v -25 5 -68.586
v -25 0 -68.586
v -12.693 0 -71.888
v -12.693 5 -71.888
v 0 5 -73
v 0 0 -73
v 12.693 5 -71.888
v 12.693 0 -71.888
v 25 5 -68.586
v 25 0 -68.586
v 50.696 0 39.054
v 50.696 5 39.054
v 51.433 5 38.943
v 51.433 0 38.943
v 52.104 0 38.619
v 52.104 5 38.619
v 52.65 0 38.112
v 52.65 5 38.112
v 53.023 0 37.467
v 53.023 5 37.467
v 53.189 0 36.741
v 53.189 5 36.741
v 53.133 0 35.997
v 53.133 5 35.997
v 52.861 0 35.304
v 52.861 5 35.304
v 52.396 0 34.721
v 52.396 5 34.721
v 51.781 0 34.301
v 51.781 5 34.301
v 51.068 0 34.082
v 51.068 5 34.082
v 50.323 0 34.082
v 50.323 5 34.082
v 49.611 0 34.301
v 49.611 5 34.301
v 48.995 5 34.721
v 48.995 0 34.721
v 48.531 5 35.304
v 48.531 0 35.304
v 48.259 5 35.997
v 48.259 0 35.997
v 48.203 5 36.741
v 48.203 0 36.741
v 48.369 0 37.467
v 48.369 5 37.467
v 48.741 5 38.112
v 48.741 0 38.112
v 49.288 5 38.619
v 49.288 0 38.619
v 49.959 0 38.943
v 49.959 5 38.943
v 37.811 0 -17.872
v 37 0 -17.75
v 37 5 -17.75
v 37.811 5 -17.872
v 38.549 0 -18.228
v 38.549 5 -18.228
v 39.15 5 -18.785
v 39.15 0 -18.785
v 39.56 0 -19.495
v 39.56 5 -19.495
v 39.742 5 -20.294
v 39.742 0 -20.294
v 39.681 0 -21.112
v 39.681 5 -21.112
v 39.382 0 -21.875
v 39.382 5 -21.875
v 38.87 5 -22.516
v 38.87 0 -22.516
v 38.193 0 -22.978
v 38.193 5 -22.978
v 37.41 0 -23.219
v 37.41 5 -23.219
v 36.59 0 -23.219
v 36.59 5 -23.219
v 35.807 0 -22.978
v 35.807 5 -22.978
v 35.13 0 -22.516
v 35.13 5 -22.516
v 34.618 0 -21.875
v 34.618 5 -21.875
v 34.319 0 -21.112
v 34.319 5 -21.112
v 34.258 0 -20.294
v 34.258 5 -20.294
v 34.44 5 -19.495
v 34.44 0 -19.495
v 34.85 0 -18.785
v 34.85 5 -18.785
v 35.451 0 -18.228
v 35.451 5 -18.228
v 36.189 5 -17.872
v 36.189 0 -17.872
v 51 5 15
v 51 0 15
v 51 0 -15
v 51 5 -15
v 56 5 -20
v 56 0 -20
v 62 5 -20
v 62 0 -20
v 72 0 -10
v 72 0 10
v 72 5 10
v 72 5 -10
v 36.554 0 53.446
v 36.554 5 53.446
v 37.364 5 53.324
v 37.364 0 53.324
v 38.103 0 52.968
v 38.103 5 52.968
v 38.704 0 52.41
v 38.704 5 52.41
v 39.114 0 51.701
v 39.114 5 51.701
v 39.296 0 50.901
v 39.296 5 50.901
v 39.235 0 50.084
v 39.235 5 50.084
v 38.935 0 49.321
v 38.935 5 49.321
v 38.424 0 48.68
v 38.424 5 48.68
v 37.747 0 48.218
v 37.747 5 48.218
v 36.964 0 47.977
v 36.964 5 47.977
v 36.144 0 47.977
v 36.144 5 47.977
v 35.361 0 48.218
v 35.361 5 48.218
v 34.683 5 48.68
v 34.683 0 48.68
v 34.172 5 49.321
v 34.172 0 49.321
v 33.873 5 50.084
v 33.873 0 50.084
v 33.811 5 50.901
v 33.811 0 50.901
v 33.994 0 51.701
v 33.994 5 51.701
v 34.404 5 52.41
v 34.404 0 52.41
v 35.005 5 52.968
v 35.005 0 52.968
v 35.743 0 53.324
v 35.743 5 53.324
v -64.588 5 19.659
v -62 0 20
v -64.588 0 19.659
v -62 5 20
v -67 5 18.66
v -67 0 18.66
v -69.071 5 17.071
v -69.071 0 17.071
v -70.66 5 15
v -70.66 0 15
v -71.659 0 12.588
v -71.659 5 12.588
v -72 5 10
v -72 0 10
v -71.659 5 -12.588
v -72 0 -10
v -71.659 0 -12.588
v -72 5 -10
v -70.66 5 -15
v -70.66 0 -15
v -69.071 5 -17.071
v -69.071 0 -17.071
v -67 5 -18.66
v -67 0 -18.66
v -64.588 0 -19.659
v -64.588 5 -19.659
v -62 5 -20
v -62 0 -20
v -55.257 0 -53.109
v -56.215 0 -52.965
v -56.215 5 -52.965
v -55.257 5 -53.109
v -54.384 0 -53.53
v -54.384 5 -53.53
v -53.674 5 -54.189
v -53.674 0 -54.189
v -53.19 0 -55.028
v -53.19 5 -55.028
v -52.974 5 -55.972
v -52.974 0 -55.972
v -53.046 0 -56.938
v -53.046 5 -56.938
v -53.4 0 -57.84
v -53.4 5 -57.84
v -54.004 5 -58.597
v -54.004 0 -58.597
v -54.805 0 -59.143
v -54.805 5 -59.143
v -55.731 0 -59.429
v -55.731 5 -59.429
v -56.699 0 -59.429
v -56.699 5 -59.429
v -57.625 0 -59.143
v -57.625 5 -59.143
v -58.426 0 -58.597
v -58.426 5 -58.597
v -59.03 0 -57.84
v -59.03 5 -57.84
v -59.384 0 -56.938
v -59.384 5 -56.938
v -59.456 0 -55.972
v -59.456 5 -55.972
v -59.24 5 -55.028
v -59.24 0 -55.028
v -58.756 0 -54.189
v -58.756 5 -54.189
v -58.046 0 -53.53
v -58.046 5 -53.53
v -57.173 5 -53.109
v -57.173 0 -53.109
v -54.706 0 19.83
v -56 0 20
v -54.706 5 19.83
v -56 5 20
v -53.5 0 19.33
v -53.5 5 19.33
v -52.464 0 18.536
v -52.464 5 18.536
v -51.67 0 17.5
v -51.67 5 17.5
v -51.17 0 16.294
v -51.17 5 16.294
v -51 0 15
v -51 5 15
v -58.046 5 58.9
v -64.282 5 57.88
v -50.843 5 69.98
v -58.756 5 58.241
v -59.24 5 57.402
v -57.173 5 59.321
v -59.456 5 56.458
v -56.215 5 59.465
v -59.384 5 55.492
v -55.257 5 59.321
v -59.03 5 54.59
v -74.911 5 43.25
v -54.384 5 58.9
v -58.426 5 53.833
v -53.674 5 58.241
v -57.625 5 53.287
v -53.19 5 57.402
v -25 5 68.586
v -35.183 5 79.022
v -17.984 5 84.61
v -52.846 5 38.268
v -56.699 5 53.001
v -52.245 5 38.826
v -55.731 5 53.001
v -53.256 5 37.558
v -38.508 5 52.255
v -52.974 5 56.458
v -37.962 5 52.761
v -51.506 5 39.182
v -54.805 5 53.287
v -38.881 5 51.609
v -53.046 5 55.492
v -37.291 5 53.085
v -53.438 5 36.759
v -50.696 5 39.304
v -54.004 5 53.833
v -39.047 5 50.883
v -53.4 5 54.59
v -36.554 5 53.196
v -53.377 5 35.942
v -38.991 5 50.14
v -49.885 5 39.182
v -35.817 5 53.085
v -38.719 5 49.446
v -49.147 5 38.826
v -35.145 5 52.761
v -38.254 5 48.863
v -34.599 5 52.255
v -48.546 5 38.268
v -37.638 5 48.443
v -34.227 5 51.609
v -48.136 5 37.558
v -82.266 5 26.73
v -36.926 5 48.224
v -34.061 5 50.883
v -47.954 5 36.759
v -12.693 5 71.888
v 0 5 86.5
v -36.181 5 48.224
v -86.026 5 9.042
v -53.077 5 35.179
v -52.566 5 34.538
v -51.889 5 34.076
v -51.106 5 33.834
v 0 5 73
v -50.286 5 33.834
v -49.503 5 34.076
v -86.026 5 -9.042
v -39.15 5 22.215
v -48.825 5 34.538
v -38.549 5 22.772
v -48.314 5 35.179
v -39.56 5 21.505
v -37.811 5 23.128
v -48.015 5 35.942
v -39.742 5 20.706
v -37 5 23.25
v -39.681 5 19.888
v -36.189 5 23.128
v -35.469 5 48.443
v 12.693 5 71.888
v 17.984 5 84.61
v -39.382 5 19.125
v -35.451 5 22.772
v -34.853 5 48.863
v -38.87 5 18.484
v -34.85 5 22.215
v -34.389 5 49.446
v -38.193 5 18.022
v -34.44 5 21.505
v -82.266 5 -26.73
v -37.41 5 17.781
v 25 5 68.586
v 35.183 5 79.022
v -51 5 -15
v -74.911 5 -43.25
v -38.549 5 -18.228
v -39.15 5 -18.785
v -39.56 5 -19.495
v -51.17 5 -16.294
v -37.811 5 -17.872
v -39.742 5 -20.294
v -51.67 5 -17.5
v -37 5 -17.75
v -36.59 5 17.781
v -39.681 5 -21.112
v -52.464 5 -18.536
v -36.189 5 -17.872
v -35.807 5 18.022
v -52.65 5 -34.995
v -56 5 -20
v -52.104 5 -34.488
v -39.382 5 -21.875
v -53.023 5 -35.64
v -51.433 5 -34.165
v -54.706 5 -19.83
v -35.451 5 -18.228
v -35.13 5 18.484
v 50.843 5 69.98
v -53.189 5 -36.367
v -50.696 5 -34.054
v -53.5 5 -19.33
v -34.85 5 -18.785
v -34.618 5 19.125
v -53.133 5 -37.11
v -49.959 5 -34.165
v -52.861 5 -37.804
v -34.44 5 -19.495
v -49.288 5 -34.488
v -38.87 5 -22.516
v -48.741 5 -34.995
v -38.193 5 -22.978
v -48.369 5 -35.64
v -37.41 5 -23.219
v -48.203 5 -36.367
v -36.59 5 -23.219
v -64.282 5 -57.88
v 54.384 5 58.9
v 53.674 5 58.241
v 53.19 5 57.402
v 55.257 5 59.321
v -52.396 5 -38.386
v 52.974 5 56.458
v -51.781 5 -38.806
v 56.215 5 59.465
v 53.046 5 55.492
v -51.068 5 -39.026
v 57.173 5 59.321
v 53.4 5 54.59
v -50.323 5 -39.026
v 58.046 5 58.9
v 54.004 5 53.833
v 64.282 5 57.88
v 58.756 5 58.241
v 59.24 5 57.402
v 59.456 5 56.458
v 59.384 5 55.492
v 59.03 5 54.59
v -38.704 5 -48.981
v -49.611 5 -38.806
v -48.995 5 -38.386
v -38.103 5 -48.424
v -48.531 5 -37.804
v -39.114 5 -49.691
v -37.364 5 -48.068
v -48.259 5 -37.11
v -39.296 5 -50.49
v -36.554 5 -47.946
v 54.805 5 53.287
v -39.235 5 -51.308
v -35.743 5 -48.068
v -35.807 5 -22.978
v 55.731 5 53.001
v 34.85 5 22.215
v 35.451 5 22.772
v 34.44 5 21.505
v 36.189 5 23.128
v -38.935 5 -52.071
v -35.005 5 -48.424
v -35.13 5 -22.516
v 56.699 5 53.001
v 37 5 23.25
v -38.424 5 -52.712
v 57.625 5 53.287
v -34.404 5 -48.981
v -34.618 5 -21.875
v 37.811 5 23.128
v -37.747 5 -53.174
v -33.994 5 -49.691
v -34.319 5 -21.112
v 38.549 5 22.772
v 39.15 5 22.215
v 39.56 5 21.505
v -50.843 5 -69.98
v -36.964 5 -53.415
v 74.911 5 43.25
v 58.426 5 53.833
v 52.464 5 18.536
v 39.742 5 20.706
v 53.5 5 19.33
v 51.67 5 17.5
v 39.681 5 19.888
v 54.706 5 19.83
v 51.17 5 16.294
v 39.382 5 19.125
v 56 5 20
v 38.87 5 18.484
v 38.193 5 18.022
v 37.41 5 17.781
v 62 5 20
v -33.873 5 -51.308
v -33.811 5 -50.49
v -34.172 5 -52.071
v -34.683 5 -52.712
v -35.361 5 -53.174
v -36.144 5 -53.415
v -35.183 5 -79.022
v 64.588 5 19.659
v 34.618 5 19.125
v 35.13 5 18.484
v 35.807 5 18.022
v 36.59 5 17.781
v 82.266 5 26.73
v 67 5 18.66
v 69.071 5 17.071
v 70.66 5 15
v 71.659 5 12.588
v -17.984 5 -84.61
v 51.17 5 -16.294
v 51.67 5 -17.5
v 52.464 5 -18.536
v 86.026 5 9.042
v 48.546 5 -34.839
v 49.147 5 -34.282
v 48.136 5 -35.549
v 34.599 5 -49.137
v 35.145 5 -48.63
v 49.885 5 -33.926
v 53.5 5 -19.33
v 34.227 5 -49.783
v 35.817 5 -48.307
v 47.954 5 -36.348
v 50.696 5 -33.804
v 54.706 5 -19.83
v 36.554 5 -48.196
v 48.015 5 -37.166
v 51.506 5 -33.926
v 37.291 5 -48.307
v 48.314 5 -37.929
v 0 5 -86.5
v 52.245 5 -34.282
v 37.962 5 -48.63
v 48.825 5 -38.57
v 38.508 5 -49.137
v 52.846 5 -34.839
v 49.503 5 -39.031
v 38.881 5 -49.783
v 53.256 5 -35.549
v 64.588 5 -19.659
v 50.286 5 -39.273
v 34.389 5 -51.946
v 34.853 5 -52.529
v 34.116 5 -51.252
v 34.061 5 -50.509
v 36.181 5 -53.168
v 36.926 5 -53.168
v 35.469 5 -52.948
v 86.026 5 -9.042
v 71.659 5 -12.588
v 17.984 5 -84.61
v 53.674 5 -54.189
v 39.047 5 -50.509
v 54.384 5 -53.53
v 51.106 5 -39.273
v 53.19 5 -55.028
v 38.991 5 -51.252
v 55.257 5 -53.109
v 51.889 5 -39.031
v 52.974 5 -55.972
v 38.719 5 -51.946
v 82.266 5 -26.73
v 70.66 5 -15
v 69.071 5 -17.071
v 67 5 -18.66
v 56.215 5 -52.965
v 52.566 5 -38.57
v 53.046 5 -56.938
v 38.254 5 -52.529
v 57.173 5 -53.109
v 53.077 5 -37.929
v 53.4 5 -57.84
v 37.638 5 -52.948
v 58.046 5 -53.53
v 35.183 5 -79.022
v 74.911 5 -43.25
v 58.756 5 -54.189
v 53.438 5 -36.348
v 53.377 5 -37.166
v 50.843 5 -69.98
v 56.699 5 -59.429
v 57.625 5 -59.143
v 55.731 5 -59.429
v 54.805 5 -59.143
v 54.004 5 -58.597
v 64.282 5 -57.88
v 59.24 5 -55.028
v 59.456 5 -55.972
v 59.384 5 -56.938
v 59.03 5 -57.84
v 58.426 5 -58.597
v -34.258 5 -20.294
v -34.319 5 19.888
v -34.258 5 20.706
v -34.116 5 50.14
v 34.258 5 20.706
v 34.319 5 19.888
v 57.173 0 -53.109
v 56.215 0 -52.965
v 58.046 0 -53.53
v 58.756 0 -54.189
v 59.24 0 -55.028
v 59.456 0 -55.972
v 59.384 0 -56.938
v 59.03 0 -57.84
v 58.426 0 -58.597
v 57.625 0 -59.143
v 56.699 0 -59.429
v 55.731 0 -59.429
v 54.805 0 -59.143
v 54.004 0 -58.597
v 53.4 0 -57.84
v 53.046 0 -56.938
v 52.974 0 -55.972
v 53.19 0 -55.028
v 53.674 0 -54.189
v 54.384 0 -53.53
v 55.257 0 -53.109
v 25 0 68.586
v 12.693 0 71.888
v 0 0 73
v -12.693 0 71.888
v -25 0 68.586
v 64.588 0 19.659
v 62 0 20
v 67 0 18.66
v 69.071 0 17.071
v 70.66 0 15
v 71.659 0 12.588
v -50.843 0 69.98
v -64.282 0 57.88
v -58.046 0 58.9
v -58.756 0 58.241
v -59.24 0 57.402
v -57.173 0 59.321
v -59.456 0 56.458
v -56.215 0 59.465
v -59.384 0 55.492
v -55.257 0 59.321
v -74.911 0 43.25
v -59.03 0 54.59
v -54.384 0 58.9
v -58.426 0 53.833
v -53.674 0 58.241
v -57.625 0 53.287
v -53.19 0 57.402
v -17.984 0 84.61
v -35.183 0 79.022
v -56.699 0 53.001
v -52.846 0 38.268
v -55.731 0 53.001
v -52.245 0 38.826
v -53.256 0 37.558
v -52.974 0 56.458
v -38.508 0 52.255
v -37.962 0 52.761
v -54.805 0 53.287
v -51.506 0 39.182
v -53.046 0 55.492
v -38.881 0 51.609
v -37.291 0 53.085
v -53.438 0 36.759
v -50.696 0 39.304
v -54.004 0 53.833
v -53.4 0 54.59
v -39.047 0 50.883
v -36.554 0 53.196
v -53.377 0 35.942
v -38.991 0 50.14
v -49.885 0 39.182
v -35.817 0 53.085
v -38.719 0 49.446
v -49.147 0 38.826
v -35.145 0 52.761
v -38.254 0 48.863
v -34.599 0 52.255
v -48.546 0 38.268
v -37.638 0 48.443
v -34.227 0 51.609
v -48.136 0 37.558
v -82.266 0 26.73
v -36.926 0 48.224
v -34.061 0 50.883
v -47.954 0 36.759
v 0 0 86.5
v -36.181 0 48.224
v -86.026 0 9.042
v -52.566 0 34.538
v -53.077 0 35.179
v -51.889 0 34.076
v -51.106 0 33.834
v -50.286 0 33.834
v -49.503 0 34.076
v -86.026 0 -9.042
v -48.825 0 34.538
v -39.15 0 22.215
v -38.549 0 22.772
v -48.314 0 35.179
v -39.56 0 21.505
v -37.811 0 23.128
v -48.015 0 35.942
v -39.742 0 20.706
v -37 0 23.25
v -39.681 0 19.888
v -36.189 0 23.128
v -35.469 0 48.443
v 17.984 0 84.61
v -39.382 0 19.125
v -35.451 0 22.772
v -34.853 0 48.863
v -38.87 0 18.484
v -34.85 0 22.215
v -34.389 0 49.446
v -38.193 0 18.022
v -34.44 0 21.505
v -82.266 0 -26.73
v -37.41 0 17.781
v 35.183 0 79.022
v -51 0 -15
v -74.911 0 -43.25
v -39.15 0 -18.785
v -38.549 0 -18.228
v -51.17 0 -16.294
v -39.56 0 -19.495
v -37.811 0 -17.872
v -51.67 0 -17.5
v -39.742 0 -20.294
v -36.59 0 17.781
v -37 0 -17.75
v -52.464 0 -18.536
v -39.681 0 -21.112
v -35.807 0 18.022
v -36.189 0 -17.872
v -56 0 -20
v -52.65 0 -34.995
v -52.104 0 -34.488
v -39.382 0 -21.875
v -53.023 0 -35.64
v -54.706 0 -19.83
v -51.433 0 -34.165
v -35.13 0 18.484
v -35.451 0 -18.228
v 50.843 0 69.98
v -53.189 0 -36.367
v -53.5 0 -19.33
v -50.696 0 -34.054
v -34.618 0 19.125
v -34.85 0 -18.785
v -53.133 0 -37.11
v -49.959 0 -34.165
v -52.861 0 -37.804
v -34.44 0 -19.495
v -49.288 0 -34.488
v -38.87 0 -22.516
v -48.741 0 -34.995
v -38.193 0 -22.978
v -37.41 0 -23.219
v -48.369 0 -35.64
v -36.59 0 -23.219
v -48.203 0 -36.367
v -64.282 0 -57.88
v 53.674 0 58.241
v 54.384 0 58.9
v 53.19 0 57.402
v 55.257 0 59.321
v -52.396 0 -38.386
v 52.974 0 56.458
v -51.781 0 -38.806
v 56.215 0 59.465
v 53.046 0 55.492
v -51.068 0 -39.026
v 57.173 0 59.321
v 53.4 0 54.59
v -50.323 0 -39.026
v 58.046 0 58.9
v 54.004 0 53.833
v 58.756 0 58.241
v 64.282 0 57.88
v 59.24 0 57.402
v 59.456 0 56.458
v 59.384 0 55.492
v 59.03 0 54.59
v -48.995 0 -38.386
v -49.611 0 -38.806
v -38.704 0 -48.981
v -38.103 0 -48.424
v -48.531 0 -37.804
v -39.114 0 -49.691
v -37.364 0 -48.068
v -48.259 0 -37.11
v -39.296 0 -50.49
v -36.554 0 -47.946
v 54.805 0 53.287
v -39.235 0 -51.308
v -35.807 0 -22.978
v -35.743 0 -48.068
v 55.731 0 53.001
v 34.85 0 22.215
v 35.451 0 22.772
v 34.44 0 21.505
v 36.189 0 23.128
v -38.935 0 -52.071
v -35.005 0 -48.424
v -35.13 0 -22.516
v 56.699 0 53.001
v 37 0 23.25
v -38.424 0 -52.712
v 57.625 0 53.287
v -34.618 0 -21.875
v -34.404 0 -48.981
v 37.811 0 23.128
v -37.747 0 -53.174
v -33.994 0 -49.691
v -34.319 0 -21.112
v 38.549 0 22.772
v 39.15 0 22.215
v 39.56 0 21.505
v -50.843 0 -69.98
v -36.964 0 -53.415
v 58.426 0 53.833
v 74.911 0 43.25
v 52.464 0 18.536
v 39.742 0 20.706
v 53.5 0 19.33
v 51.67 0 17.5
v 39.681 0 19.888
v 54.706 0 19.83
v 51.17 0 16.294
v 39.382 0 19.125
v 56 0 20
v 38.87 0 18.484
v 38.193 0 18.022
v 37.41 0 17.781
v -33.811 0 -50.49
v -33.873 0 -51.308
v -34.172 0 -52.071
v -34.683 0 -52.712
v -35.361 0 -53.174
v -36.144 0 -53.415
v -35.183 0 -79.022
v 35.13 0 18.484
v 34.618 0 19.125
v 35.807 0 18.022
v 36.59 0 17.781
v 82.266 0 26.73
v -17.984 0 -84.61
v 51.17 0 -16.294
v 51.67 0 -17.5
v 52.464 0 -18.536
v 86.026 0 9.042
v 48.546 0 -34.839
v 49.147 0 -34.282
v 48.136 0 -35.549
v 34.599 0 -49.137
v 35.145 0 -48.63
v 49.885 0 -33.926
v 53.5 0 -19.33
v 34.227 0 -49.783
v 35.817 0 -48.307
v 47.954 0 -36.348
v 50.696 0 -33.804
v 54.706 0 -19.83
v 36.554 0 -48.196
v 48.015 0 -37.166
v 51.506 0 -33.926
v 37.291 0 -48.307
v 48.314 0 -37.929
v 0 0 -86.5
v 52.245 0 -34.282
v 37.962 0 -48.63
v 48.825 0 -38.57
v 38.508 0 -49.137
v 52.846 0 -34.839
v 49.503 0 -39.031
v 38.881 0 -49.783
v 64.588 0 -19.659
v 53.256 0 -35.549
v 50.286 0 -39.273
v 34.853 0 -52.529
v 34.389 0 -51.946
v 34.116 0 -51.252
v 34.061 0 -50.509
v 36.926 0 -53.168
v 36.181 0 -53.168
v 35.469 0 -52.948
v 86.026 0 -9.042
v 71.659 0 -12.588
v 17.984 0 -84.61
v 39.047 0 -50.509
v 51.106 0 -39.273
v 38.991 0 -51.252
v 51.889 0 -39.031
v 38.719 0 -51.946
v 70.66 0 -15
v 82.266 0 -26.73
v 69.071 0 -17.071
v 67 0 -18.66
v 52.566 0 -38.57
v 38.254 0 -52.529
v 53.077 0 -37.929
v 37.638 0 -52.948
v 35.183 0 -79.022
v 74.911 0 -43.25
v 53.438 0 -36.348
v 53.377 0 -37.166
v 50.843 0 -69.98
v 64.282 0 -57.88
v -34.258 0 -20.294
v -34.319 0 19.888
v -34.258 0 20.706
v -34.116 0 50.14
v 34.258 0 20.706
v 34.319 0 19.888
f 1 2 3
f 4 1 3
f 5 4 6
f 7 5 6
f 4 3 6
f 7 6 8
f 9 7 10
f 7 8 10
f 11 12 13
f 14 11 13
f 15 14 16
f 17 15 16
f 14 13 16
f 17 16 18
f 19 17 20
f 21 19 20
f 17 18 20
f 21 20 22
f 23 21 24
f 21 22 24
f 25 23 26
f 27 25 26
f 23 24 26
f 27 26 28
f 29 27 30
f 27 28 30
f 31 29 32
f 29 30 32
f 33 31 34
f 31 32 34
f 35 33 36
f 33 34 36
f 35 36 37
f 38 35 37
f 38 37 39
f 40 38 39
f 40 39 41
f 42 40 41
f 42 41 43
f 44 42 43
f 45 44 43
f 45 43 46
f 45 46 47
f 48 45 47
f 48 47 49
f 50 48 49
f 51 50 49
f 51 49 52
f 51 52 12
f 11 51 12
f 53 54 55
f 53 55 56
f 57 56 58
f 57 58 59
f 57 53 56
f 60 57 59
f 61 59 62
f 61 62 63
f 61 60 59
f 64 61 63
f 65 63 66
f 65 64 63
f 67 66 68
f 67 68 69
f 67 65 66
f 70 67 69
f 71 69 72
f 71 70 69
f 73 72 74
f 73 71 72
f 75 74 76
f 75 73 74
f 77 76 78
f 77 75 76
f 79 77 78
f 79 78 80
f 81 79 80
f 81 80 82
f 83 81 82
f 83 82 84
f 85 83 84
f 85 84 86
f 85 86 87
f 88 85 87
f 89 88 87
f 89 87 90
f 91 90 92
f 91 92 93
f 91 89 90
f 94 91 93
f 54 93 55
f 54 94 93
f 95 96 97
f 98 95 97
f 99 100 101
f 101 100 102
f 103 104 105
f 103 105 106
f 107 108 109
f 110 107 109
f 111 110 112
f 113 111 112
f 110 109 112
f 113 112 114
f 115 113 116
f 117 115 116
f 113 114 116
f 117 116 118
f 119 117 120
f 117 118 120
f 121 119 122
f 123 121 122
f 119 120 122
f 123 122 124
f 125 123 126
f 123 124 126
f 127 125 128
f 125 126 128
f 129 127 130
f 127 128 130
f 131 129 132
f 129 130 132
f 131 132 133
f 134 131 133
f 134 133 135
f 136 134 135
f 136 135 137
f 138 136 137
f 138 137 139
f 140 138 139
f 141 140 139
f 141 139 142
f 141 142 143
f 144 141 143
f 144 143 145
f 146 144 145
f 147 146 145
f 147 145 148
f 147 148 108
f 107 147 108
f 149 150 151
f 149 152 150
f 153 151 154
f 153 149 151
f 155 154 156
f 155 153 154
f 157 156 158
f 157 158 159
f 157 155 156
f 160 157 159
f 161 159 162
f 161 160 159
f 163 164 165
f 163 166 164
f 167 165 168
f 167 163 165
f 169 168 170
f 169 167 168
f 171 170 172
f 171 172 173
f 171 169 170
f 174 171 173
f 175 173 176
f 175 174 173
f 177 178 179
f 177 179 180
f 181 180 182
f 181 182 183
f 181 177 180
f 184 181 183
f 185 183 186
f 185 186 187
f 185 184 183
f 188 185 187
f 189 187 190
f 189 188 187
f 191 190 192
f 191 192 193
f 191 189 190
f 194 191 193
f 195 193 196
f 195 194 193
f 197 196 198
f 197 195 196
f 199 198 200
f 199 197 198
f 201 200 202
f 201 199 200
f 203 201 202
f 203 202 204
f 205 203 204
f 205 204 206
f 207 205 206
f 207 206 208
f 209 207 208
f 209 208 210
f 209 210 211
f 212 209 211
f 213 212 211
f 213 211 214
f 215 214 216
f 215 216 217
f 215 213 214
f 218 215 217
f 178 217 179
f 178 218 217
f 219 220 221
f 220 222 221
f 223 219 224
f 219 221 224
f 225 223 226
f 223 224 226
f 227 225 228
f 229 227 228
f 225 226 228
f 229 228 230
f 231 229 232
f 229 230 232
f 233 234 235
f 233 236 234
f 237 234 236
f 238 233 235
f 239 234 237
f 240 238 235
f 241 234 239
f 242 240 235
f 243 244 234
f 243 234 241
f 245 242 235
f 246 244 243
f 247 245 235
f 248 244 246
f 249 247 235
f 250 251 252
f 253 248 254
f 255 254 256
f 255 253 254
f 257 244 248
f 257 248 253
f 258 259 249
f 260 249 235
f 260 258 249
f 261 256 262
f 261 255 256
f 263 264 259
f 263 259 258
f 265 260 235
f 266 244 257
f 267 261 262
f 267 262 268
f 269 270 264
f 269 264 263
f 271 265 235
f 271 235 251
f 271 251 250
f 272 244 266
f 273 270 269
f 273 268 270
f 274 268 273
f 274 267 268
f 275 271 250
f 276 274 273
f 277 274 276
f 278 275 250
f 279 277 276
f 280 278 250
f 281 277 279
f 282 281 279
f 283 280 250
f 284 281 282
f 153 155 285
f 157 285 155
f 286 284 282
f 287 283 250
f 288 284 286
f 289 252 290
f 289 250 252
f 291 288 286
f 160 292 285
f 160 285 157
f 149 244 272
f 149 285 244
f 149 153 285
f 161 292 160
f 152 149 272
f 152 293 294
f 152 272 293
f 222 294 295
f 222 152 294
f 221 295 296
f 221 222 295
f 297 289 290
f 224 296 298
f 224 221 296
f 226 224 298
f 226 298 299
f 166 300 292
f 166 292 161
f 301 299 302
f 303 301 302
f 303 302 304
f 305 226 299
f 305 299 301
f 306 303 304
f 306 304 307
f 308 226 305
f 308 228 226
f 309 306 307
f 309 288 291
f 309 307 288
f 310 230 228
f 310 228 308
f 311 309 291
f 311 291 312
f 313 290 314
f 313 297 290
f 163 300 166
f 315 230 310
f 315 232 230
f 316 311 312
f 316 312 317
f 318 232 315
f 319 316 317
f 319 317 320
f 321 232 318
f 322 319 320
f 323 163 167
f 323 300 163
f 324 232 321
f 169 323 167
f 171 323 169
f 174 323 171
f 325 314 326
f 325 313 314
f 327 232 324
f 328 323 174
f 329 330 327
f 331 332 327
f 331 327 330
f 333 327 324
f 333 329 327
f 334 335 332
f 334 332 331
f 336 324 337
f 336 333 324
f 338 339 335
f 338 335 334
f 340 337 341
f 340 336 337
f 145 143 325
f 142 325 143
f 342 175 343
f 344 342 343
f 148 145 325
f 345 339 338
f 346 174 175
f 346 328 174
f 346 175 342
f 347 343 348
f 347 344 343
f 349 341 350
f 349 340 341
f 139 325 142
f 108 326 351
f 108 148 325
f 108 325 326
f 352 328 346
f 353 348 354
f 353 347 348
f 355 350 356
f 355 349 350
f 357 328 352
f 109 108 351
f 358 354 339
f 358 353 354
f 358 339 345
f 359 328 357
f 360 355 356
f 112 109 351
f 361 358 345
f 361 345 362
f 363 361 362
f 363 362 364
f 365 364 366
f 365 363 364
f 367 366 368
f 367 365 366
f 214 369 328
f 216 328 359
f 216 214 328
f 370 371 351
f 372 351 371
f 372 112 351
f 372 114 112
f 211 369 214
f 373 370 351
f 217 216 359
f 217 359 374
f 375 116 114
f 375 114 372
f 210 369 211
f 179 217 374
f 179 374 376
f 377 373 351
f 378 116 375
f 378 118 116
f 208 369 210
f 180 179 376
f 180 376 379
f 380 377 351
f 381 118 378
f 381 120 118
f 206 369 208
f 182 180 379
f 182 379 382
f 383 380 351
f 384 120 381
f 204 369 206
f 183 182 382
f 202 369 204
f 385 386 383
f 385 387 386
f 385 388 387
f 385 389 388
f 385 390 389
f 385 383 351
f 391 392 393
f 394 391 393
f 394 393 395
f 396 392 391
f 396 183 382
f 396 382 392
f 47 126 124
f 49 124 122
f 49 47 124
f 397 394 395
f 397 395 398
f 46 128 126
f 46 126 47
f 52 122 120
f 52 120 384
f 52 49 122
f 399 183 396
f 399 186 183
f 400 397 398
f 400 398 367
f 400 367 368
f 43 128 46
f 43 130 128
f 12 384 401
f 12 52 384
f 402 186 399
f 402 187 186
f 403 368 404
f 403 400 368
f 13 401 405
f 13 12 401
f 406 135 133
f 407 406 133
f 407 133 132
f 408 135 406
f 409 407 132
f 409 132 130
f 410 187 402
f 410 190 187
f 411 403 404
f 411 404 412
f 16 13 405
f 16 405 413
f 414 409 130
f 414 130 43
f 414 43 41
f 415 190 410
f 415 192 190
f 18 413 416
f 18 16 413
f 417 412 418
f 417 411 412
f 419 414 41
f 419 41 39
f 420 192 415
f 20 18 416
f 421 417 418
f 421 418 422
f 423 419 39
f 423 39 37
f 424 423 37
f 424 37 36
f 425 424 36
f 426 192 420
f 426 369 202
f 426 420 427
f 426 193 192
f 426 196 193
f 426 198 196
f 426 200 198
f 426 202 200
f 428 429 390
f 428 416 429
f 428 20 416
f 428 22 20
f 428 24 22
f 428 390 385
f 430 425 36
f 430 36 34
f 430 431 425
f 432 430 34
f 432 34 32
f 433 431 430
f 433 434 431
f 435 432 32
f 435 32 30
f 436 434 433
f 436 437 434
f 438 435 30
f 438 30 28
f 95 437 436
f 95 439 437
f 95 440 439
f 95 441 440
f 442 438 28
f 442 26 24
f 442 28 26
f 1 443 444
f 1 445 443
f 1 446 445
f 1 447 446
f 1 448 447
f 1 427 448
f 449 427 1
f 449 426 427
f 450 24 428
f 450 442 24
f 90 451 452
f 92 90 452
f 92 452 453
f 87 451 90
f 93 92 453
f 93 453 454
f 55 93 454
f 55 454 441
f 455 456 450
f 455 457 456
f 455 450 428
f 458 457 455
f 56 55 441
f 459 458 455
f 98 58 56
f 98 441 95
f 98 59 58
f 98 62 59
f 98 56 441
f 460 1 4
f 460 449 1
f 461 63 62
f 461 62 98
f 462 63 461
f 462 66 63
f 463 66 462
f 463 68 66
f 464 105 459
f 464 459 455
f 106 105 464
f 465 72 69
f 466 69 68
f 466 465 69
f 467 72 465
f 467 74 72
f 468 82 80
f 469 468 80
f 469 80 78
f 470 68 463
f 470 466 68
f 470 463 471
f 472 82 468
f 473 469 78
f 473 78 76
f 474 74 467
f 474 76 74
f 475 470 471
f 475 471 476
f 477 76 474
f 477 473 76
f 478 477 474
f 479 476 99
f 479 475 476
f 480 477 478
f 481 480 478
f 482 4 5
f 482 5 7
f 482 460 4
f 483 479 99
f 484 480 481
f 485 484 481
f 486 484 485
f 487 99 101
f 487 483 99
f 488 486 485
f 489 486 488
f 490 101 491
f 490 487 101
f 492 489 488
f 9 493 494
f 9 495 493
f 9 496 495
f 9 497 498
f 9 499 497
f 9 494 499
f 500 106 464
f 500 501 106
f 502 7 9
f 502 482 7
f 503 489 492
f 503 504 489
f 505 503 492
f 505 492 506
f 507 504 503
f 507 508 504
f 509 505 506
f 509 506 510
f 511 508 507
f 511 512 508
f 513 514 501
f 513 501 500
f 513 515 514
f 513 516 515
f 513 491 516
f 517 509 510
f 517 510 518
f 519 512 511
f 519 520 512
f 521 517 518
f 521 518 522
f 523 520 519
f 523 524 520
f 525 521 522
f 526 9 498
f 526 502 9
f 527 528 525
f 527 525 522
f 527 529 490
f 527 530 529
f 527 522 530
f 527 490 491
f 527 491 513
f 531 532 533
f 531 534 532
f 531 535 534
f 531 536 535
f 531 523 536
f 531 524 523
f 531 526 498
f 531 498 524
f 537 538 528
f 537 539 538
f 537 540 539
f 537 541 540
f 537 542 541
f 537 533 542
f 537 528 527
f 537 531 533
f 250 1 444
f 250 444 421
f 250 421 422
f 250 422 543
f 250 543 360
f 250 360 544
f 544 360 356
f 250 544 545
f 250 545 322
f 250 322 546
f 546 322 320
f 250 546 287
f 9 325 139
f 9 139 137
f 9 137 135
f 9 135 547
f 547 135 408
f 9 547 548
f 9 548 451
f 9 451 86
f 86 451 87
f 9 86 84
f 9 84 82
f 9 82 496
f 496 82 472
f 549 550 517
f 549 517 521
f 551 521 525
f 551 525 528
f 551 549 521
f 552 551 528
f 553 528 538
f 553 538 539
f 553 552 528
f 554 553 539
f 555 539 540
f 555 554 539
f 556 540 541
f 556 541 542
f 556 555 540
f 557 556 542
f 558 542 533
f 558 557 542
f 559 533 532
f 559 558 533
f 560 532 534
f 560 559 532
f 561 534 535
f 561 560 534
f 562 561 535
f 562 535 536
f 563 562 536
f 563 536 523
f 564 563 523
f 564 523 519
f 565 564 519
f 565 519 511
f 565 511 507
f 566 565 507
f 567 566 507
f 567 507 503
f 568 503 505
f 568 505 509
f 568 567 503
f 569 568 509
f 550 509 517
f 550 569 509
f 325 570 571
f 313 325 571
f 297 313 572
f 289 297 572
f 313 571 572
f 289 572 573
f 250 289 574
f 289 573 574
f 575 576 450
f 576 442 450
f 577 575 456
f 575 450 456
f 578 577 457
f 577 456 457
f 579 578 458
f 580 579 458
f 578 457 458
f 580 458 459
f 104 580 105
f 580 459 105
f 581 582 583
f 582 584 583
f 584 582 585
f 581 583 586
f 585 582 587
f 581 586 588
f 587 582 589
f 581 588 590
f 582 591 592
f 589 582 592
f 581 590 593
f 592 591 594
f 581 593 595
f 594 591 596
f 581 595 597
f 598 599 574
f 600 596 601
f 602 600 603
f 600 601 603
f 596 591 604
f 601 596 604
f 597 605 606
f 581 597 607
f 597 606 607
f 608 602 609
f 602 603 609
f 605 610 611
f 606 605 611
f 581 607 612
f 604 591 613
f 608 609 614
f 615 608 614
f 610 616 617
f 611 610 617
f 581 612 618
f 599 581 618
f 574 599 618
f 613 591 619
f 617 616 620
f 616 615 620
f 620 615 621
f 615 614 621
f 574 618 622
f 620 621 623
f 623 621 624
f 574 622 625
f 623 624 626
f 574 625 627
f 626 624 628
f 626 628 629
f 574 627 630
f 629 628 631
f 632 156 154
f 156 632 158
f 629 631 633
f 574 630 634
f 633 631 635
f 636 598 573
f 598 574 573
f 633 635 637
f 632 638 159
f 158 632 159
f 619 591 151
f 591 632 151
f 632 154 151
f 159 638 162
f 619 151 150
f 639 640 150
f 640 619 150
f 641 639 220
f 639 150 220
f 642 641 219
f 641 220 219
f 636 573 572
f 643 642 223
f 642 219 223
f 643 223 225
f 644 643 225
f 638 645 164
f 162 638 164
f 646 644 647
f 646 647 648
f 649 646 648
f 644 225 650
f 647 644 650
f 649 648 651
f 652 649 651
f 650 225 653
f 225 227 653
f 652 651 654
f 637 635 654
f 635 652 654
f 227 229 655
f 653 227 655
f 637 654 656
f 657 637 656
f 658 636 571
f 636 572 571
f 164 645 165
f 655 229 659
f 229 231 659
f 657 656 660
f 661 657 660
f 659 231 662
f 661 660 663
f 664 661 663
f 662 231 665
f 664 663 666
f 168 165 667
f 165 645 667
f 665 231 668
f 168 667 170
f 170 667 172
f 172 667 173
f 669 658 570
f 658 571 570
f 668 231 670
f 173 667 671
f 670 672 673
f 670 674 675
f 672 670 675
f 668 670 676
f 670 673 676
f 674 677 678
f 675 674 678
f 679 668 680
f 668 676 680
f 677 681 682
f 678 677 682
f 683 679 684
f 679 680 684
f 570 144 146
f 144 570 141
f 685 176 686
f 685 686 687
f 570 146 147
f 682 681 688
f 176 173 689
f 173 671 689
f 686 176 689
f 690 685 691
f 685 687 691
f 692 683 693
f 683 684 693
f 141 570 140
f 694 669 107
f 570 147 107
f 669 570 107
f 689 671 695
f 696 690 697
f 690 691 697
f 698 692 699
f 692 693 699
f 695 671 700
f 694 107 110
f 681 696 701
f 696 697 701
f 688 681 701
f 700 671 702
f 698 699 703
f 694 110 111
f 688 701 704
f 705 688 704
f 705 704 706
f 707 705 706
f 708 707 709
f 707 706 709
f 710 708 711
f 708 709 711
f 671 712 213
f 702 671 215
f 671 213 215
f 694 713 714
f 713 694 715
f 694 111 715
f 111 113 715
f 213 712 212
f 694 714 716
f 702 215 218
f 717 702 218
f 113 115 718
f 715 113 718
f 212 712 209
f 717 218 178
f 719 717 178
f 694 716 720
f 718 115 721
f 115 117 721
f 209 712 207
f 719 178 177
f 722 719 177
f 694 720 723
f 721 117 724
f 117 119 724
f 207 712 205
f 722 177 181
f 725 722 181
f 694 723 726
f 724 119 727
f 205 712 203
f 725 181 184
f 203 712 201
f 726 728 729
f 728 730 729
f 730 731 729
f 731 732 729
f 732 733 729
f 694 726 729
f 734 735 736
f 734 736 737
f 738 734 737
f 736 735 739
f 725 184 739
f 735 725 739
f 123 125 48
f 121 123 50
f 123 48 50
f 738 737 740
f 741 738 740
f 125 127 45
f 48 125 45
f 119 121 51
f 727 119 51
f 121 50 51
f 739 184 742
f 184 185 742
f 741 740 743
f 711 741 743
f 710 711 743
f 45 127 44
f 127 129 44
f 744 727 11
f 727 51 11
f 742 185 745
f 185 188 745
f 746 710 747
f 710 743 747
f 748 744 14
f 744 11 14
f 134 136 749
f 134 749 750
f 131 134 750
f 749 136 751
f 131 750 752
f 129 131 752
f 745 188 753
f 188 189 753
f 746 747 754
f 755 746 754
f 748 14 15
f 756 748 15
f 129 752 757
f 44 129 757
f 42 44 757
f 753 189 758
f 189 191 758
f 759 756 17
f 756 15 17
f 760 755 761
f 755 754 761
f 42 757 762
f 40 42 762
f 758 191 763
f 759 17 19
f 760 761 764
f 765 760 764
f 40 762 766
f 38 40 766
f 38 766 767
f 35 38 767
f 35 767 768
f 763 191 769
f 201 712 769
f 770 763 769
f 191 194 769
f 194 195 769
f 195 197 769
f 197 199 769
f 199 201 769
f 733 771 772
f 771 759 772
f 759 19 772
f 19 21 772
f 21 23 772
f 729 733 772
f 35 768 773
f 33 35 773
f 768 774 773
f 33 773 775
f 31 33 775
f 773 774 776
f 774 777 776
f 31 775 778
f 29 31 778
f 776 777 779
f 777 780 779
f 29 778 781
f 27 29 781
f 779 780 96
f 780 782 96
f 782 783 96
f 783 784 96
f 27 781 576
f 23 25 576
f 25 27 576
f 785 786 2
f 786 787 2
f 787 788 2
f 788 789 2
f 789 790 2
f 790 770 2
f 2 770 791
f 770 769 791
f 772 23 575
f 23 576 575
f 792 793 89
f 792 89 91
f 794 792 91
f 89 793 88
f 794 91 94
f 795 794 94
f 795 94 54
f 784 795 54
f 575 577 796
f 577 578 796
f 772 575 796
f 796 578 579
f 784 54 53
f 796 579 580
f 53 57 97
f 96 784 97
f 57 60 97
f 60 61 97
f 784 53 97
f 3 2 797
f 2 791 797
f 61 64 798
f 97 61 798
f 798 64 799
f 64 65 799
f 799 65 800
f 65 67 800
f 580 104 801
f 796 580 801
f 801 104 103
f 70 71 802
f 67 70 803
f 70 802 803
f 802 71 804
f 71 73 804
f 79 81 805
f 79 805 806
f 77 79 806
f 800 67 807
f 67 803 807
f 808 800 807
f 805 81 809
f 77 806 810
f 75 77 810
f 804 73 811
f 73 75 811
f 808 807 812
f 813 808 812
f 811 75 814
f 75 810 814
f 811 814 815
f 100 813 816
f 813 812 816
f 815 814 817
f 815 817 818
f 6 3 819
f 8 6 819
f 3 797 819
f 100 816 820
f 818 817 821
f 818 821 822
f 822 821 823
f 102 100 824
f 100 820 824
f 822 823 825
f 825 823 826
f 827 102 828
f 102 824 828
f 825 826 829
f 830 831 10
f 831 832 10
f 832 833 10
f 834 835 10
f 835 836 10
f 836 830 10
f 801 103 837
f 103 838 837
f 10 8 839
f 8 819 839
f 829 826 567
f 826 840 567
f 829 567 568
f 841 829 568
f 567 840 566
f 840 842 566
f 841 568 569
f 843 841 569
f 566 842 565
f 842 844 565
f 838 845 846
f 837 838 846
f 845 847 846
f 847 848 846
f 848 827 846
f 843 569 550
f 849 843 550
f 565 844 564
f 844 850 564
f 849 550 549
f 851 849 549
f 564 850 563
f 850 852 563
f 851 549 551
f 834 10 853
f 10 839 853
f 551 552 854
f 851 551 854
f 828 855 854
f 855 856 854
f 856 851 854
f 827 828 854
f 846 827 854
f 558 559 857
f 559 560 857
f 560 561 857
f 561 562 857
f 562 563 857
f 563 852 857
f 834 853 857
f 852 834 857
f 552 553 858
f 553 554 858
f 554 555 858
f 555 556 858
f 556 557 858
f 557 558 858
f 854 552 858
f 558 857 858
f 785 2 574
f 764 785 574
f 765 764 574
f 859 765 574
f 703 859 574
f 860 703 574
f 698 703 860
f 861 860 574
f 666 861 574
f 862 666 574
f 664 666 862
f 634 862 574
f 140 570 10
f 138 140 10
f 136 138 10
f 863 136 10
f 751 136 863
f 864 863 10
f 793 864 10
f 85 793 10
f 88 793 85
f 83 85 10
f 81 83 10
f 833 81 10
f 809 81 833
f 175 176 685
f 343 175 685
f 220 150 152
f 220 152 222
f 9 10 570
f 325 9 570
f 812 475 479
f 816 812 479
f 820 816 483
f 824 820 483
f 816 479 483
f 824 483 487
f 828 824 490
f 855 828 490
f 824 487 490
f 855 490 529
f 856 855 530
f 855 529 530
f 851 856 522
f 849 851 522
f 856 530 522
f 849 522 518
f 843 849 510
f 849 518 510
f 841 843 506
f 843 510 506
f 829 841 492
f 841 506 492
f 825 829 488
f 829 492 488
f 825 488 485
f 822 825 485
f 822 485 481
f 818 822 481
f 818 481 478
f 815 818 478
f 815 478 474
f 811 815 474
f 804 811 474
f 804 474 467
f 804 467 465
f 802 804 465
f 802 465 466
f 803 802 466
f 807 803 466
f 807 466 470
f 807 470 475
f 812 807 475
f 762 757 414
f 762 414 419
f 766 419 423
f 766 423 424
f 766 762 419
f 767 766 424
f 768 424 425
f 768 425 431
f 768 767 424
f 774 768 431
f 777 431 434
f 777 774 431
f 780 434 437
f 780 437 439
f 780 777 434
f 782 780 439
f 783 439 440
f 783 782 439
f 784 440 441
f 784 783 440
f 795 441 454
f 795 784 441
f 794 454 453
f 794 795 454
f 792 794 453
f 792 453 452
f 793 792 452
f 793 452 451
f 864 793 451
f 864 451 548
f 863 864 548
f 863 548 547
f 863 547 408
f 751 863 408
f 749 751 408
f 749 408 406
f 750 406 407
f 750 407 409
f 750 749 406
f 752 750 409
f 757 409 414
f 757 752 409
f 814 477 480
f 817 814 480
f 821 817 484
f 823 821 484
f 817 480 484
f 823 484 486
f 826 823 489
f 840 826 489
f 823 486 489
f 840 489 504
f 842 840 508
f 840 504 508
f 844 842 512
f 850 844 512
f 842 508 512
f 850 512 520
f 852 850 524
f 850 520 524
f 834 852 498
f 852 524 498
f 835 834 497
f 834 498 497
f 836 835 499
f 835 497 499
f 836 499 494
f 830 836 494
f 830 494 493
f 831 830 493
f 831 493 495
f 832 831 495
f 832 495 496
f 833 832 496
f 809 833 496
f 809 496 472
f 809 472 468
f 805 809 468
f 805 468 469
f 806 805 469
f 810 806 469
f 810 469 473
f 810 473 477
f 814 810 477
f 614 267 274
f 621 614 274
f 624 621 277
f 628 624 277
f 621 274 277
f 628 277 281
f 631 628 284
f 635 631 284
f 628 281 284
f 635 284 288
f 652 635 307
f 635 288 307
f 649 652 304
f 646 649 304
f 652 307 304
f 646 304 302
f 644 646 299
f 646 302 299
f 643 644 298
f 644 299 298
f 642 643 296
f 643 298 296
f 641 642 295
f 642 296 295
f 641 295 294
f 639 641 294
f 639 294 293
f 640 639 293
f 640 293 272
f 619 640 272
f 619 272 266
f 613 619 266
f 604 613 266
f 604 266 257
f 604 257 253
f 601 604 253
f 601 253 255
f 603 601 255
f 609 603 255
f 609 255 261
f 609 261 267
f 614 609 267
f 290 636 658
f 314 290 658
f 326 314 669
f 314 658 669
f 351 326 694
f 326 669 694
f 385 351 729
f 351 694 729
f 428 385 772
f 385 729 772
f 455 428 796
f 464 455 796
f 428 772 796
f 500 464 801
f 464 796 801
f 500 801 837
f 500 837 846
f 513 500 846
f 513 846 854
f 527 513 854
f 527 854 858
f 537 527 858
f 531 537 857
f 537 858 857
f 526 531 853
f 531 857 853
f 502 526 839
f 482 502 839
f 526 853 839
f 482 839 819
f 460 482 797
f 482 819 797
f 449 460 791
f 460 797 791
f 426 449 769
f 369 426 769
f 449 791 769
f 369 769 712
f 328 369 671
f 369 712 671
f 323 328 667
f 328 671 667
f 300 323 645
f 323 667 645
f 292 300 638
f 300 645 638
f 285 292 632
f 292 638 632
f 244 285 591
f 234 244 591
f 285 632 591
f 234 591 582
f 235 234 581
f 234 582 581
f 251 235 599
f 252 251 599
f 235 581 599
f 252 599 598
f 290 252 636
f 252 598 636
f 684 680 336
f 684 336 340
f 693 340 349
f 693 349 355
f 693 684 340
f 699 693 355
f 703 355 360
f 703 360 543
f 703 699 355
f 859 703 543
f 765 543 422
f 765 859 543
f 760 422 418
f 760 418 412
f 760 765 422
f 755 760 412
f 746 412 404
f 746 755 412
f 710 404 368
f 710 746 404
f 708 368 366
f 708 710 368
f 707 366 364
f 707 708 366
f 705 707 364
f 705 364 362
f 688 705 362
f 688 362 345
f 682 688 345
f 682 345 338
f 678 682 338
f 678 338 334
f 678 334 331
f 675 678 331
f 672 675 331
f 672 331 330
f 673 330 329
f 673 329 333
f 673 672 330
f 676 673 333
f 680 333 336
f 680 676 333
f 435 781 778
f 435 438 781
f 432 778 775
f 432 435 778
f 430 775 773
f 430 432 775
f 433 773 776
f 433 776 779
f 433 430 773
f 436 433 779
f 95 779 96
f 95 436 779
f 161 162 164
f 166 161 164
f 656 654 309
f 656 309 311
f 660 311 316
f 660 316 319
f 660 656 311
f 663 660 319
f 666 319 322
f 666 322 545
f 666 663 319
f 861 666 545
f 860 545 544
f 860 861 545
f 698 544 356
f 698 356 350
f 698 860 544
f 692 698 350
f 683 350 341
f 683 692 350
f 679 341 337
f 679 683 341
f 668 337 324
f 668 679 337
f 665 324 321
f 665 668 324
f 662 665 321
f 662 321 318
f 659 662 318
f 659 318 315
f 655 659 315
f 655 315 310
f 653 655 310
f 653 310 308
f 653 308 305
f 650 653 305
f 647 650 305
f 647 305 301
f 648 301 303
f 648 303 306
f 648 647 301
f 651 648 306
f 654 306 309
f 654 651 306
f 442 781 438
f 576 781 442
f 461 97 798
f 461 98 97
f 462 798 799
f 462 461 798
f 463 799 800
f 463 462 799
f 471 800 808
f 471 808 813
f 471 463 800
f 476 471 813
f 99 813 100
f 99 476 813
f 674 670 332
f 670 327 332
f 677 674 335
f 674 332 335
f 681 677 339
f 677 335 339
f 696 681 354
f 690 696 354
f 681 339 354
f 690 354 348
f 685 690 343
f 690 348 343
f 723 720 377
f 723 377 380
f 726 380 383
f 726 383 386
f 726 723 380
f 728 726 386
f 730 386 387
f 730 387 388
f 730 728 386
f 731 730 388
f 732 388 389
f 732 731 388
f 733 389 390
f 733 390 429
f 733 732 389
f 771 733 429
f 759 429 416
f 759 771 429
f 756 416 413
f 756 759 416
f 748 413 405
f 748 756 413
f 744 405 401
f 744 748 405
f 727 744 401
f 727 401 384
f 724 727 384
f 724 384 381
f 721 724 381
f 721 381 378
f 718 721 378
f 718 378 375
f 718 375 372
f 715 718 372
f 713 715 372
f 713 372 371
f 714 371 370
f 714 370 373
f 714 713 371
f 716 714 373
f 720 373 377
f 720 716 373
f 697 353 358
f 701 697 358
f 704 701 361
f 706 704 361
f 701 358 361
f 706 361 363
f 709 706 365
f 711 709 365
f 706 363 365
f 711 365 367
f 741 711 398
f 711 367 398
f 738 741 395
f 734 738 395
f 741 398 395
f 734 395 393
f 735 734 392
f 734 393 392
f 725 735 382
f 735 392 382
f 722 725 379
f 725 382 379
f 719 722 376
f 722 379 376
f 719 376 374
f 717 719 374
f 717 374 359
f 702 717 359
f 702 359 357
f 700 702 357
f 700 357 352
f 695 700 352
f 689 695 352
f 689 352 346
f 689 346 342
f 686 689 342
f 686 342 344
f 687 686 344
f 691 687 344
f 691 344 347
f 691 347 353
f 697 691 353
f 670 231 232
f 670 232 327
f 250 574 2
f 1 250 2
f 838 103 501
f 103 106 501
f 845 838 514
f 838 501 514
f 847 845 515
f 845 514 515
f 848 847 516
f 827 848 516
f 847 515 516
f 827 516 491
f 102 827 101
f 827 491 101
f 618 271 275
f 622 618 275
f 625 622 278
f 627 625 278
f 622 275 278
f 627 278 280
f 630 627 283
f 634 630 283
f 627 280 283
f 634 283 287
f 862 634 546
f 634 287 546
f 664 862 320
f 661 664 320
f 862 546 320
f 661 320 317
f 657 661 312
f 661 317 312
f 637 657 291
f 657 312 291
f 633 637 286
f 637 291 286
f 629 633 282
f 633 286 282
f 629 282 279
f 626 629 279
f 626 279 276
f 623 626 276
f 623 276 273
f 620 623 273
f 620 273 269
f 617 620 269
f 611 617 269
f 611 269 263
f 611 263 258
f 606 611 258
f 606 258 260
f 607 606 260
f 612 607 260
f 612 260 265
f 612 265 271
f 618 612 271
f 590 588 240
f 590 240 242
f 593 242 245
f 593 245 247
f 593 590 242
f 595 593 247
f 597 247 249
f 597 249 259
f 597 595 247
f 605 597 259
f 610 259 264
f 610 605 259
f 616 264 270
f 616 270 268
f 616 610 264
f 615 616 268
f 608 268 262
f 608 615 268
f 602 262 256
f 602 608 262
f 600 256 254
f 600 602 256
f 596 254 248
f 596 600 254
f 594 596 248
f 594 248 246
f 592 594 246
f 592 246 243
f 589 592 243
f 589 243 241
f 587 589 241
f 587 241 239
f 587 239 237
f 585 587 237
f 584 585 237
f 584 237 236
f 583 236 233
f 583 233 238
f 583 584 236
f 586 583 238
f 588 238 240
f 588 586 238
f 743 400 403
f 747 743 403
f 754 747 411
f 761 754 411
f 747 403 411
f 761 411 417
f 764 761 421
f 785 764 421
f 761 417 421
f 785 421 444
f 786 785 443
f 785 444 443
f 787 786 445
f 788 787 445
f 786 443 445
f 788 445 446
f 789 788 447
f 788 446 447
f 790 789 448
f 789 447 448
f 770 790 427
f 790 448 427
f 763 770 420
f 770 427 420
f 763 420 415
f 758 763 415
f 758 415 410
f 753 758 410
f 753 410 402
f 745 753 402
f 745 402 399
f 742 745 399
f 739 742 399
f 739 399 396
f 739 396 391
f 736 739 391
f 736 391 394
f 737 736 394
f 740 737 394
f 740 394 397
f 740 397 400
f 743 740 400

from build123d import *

# Parameters (mm, degrees)
SKETCH1_R           = 3.25
SKETCH1_R_2         = 2.75
SKETCH1_W           = 21
SKETCH1_H           = 40
BOSS_EXTRUDE1_DEPTH = 5
FILLET1_R           = 10
FILLET3_R           = 5
SKETCH3_R           = 2.75
SKETCH3_R_2         = 2.5
CUT_EXTRUDE1_DEPTH  = 10


with BuildPart() as part:
    # Sketch1 → Boss-Extrude1 (new body)
    with BuildSketch(Plane(origin=(0, 0, 0), x_dir=(1, 0, 0), z_dir=(0, 1, 0))):
        with BuildLine():
            ThreePointArc((0, 86.5), (-86.5, 0), (0, -86.5))
            ThreePointArc((0, -86.5), (86.5, 0), (0, 86.5))
        make_face()
        with Locations(Location((-56.214989104, -56.214989104, 0), (0, 0, 270))):
            Circle(SKETCH1_R, mode=Mode.SUBTRACT)
        with Locations(Location((-37, -20.5, 0), (0, 0, 270))):
            Circle(SKETCH1_R_2, mode=Mode.SUBTRACT)
        with Locations(Location((56.214989104, -56.214989104, 0), (0, 0, 270))):
            Circle(SKETCH1_R, mode=Mode.SUBTRACT)
        with Locations(Location((37, -20.5, 0), (0, 0, 270))):
            Circle(SKETCH1_R_2, mode=Mode.SUBTRACT)
        with Locations((-61.5, 0)):
            Rectangle(SKETCH1_W, SKETCH1_H, mode=Mode.SUBTRACT)
        with Locations(Location((-37, 20.5, 0), (0, 0, 270))):
            Circle(SKETCH1_R_2, mode=Mode.SUBTRACT)
        with Locations(Location((-56.214989104, 56.214989104, 0), (0, 0, 270))):
            Circle(SKETCH1_R, mode=Mode.SUBTRACT)
        with BuildLine():
            ThreePointArc((-25, 68.585712798), (0, 73), (25, 68.585712798))
            Line((25, 68.585712798), (25, 20))
            Line((25, 20), (25, -20))
            Line((25, -20), (25, -68.585712798))
            ThreePointArc((25, -68.585712798), (0, -73), (-25, -68.585712798))
            Line((-25, -68.585712798), (-25, -20))
            Line((-25, -20), (-25, 20))
            Line((-25, 20), (-25, 68.585712798))
        make_face(mode=Mode.SUBTRACT)
        with Locations(Location((37, 20.5, 0), (0, 0, 270))):
            Circle(SKETCH1_R_2, mode=Mode.SUBTRACT)
        with Locations((61.5, 0)):
            Rectangle(SKETCH1_W, SKETCH1_H, mode=Mode.SUBTRACT)
        with Locations(Location((56.214989104, 56.214989104, 0), (0, 0, 270))):
            Circle(SKETCH1_R, mode=Mode.SUBTRACT)
    extrude(amount=BOSS_EXTRUDE1_DEPTH)

    # Fillet1
    fillet1_edges = [part.edges().sort_by_distance(p)[0] for p in [
        (72, 2.5, 20),
        (72, 2.5, -20),
        (-72, 2.5, -20),
        (-72, 2.5, 20),
    ]]
    fillet(fillet1_edges, radius=FILLET1_R)

    # Fillet3
    fillet3_edges = [part.edges().sort_by_distance(p)[0] for p in [
        (51, 2.5, -20),
        (51, 2.5, 20),
        (-51, 2.5, -20),
        (-51, 2.5, 20),
    ]]
    fillet(fillet3_edges, radius=FILLET3_R)

    # Sketch3 → Cut-Extrude1 (cut)
    with BuildSketch(Plane(origin=(0, 5, 0), x_dir=(1, 0, 0), z_dir=(0, 1, 0))):
        with Locations(Location((-50.695888728, -36.553753105, 0), (0, 0, 270))):
            Circle(SKETCH3_R)
        with Locations(Location((-36.553753105, -50.695888728, 0), (0, 0, 270))):
            Circle(SKETCH3_R_2)
        with Locations(Location((-36.553753105, 50.695888728, 0), (0, 0, 270))):
            Circle(SKETCH3_R)
        with Locations(Location((-50.695888728, 36.553753105, 0), (0, 0, 270))):
            Circle(SKETCH3_R_2)
        with Locations(Location((50.695888728, 36.553753105, 0), (0, 0, 270))):
            Circle(SKETCH3_R)
        with Locations(Location((36.553753105, 50.695888728, 0), (0, 0, 270))):
            Circle(SKETCH3_R_2)
        with Locations(Location((36.553753105, -50.695888728, 0), (0, 0, 270))):
            Circle(SKETCH3_R)
        with Locations(Location((50.695888728, -36.553753105, 0), (0, 0, 270))):
            Circle(SKETCH3_R_2)
    extrude(amount=-CUT_EXTRUDE1_DEPTH, mode=Mode.SUBTRACT)


solid = part.part
